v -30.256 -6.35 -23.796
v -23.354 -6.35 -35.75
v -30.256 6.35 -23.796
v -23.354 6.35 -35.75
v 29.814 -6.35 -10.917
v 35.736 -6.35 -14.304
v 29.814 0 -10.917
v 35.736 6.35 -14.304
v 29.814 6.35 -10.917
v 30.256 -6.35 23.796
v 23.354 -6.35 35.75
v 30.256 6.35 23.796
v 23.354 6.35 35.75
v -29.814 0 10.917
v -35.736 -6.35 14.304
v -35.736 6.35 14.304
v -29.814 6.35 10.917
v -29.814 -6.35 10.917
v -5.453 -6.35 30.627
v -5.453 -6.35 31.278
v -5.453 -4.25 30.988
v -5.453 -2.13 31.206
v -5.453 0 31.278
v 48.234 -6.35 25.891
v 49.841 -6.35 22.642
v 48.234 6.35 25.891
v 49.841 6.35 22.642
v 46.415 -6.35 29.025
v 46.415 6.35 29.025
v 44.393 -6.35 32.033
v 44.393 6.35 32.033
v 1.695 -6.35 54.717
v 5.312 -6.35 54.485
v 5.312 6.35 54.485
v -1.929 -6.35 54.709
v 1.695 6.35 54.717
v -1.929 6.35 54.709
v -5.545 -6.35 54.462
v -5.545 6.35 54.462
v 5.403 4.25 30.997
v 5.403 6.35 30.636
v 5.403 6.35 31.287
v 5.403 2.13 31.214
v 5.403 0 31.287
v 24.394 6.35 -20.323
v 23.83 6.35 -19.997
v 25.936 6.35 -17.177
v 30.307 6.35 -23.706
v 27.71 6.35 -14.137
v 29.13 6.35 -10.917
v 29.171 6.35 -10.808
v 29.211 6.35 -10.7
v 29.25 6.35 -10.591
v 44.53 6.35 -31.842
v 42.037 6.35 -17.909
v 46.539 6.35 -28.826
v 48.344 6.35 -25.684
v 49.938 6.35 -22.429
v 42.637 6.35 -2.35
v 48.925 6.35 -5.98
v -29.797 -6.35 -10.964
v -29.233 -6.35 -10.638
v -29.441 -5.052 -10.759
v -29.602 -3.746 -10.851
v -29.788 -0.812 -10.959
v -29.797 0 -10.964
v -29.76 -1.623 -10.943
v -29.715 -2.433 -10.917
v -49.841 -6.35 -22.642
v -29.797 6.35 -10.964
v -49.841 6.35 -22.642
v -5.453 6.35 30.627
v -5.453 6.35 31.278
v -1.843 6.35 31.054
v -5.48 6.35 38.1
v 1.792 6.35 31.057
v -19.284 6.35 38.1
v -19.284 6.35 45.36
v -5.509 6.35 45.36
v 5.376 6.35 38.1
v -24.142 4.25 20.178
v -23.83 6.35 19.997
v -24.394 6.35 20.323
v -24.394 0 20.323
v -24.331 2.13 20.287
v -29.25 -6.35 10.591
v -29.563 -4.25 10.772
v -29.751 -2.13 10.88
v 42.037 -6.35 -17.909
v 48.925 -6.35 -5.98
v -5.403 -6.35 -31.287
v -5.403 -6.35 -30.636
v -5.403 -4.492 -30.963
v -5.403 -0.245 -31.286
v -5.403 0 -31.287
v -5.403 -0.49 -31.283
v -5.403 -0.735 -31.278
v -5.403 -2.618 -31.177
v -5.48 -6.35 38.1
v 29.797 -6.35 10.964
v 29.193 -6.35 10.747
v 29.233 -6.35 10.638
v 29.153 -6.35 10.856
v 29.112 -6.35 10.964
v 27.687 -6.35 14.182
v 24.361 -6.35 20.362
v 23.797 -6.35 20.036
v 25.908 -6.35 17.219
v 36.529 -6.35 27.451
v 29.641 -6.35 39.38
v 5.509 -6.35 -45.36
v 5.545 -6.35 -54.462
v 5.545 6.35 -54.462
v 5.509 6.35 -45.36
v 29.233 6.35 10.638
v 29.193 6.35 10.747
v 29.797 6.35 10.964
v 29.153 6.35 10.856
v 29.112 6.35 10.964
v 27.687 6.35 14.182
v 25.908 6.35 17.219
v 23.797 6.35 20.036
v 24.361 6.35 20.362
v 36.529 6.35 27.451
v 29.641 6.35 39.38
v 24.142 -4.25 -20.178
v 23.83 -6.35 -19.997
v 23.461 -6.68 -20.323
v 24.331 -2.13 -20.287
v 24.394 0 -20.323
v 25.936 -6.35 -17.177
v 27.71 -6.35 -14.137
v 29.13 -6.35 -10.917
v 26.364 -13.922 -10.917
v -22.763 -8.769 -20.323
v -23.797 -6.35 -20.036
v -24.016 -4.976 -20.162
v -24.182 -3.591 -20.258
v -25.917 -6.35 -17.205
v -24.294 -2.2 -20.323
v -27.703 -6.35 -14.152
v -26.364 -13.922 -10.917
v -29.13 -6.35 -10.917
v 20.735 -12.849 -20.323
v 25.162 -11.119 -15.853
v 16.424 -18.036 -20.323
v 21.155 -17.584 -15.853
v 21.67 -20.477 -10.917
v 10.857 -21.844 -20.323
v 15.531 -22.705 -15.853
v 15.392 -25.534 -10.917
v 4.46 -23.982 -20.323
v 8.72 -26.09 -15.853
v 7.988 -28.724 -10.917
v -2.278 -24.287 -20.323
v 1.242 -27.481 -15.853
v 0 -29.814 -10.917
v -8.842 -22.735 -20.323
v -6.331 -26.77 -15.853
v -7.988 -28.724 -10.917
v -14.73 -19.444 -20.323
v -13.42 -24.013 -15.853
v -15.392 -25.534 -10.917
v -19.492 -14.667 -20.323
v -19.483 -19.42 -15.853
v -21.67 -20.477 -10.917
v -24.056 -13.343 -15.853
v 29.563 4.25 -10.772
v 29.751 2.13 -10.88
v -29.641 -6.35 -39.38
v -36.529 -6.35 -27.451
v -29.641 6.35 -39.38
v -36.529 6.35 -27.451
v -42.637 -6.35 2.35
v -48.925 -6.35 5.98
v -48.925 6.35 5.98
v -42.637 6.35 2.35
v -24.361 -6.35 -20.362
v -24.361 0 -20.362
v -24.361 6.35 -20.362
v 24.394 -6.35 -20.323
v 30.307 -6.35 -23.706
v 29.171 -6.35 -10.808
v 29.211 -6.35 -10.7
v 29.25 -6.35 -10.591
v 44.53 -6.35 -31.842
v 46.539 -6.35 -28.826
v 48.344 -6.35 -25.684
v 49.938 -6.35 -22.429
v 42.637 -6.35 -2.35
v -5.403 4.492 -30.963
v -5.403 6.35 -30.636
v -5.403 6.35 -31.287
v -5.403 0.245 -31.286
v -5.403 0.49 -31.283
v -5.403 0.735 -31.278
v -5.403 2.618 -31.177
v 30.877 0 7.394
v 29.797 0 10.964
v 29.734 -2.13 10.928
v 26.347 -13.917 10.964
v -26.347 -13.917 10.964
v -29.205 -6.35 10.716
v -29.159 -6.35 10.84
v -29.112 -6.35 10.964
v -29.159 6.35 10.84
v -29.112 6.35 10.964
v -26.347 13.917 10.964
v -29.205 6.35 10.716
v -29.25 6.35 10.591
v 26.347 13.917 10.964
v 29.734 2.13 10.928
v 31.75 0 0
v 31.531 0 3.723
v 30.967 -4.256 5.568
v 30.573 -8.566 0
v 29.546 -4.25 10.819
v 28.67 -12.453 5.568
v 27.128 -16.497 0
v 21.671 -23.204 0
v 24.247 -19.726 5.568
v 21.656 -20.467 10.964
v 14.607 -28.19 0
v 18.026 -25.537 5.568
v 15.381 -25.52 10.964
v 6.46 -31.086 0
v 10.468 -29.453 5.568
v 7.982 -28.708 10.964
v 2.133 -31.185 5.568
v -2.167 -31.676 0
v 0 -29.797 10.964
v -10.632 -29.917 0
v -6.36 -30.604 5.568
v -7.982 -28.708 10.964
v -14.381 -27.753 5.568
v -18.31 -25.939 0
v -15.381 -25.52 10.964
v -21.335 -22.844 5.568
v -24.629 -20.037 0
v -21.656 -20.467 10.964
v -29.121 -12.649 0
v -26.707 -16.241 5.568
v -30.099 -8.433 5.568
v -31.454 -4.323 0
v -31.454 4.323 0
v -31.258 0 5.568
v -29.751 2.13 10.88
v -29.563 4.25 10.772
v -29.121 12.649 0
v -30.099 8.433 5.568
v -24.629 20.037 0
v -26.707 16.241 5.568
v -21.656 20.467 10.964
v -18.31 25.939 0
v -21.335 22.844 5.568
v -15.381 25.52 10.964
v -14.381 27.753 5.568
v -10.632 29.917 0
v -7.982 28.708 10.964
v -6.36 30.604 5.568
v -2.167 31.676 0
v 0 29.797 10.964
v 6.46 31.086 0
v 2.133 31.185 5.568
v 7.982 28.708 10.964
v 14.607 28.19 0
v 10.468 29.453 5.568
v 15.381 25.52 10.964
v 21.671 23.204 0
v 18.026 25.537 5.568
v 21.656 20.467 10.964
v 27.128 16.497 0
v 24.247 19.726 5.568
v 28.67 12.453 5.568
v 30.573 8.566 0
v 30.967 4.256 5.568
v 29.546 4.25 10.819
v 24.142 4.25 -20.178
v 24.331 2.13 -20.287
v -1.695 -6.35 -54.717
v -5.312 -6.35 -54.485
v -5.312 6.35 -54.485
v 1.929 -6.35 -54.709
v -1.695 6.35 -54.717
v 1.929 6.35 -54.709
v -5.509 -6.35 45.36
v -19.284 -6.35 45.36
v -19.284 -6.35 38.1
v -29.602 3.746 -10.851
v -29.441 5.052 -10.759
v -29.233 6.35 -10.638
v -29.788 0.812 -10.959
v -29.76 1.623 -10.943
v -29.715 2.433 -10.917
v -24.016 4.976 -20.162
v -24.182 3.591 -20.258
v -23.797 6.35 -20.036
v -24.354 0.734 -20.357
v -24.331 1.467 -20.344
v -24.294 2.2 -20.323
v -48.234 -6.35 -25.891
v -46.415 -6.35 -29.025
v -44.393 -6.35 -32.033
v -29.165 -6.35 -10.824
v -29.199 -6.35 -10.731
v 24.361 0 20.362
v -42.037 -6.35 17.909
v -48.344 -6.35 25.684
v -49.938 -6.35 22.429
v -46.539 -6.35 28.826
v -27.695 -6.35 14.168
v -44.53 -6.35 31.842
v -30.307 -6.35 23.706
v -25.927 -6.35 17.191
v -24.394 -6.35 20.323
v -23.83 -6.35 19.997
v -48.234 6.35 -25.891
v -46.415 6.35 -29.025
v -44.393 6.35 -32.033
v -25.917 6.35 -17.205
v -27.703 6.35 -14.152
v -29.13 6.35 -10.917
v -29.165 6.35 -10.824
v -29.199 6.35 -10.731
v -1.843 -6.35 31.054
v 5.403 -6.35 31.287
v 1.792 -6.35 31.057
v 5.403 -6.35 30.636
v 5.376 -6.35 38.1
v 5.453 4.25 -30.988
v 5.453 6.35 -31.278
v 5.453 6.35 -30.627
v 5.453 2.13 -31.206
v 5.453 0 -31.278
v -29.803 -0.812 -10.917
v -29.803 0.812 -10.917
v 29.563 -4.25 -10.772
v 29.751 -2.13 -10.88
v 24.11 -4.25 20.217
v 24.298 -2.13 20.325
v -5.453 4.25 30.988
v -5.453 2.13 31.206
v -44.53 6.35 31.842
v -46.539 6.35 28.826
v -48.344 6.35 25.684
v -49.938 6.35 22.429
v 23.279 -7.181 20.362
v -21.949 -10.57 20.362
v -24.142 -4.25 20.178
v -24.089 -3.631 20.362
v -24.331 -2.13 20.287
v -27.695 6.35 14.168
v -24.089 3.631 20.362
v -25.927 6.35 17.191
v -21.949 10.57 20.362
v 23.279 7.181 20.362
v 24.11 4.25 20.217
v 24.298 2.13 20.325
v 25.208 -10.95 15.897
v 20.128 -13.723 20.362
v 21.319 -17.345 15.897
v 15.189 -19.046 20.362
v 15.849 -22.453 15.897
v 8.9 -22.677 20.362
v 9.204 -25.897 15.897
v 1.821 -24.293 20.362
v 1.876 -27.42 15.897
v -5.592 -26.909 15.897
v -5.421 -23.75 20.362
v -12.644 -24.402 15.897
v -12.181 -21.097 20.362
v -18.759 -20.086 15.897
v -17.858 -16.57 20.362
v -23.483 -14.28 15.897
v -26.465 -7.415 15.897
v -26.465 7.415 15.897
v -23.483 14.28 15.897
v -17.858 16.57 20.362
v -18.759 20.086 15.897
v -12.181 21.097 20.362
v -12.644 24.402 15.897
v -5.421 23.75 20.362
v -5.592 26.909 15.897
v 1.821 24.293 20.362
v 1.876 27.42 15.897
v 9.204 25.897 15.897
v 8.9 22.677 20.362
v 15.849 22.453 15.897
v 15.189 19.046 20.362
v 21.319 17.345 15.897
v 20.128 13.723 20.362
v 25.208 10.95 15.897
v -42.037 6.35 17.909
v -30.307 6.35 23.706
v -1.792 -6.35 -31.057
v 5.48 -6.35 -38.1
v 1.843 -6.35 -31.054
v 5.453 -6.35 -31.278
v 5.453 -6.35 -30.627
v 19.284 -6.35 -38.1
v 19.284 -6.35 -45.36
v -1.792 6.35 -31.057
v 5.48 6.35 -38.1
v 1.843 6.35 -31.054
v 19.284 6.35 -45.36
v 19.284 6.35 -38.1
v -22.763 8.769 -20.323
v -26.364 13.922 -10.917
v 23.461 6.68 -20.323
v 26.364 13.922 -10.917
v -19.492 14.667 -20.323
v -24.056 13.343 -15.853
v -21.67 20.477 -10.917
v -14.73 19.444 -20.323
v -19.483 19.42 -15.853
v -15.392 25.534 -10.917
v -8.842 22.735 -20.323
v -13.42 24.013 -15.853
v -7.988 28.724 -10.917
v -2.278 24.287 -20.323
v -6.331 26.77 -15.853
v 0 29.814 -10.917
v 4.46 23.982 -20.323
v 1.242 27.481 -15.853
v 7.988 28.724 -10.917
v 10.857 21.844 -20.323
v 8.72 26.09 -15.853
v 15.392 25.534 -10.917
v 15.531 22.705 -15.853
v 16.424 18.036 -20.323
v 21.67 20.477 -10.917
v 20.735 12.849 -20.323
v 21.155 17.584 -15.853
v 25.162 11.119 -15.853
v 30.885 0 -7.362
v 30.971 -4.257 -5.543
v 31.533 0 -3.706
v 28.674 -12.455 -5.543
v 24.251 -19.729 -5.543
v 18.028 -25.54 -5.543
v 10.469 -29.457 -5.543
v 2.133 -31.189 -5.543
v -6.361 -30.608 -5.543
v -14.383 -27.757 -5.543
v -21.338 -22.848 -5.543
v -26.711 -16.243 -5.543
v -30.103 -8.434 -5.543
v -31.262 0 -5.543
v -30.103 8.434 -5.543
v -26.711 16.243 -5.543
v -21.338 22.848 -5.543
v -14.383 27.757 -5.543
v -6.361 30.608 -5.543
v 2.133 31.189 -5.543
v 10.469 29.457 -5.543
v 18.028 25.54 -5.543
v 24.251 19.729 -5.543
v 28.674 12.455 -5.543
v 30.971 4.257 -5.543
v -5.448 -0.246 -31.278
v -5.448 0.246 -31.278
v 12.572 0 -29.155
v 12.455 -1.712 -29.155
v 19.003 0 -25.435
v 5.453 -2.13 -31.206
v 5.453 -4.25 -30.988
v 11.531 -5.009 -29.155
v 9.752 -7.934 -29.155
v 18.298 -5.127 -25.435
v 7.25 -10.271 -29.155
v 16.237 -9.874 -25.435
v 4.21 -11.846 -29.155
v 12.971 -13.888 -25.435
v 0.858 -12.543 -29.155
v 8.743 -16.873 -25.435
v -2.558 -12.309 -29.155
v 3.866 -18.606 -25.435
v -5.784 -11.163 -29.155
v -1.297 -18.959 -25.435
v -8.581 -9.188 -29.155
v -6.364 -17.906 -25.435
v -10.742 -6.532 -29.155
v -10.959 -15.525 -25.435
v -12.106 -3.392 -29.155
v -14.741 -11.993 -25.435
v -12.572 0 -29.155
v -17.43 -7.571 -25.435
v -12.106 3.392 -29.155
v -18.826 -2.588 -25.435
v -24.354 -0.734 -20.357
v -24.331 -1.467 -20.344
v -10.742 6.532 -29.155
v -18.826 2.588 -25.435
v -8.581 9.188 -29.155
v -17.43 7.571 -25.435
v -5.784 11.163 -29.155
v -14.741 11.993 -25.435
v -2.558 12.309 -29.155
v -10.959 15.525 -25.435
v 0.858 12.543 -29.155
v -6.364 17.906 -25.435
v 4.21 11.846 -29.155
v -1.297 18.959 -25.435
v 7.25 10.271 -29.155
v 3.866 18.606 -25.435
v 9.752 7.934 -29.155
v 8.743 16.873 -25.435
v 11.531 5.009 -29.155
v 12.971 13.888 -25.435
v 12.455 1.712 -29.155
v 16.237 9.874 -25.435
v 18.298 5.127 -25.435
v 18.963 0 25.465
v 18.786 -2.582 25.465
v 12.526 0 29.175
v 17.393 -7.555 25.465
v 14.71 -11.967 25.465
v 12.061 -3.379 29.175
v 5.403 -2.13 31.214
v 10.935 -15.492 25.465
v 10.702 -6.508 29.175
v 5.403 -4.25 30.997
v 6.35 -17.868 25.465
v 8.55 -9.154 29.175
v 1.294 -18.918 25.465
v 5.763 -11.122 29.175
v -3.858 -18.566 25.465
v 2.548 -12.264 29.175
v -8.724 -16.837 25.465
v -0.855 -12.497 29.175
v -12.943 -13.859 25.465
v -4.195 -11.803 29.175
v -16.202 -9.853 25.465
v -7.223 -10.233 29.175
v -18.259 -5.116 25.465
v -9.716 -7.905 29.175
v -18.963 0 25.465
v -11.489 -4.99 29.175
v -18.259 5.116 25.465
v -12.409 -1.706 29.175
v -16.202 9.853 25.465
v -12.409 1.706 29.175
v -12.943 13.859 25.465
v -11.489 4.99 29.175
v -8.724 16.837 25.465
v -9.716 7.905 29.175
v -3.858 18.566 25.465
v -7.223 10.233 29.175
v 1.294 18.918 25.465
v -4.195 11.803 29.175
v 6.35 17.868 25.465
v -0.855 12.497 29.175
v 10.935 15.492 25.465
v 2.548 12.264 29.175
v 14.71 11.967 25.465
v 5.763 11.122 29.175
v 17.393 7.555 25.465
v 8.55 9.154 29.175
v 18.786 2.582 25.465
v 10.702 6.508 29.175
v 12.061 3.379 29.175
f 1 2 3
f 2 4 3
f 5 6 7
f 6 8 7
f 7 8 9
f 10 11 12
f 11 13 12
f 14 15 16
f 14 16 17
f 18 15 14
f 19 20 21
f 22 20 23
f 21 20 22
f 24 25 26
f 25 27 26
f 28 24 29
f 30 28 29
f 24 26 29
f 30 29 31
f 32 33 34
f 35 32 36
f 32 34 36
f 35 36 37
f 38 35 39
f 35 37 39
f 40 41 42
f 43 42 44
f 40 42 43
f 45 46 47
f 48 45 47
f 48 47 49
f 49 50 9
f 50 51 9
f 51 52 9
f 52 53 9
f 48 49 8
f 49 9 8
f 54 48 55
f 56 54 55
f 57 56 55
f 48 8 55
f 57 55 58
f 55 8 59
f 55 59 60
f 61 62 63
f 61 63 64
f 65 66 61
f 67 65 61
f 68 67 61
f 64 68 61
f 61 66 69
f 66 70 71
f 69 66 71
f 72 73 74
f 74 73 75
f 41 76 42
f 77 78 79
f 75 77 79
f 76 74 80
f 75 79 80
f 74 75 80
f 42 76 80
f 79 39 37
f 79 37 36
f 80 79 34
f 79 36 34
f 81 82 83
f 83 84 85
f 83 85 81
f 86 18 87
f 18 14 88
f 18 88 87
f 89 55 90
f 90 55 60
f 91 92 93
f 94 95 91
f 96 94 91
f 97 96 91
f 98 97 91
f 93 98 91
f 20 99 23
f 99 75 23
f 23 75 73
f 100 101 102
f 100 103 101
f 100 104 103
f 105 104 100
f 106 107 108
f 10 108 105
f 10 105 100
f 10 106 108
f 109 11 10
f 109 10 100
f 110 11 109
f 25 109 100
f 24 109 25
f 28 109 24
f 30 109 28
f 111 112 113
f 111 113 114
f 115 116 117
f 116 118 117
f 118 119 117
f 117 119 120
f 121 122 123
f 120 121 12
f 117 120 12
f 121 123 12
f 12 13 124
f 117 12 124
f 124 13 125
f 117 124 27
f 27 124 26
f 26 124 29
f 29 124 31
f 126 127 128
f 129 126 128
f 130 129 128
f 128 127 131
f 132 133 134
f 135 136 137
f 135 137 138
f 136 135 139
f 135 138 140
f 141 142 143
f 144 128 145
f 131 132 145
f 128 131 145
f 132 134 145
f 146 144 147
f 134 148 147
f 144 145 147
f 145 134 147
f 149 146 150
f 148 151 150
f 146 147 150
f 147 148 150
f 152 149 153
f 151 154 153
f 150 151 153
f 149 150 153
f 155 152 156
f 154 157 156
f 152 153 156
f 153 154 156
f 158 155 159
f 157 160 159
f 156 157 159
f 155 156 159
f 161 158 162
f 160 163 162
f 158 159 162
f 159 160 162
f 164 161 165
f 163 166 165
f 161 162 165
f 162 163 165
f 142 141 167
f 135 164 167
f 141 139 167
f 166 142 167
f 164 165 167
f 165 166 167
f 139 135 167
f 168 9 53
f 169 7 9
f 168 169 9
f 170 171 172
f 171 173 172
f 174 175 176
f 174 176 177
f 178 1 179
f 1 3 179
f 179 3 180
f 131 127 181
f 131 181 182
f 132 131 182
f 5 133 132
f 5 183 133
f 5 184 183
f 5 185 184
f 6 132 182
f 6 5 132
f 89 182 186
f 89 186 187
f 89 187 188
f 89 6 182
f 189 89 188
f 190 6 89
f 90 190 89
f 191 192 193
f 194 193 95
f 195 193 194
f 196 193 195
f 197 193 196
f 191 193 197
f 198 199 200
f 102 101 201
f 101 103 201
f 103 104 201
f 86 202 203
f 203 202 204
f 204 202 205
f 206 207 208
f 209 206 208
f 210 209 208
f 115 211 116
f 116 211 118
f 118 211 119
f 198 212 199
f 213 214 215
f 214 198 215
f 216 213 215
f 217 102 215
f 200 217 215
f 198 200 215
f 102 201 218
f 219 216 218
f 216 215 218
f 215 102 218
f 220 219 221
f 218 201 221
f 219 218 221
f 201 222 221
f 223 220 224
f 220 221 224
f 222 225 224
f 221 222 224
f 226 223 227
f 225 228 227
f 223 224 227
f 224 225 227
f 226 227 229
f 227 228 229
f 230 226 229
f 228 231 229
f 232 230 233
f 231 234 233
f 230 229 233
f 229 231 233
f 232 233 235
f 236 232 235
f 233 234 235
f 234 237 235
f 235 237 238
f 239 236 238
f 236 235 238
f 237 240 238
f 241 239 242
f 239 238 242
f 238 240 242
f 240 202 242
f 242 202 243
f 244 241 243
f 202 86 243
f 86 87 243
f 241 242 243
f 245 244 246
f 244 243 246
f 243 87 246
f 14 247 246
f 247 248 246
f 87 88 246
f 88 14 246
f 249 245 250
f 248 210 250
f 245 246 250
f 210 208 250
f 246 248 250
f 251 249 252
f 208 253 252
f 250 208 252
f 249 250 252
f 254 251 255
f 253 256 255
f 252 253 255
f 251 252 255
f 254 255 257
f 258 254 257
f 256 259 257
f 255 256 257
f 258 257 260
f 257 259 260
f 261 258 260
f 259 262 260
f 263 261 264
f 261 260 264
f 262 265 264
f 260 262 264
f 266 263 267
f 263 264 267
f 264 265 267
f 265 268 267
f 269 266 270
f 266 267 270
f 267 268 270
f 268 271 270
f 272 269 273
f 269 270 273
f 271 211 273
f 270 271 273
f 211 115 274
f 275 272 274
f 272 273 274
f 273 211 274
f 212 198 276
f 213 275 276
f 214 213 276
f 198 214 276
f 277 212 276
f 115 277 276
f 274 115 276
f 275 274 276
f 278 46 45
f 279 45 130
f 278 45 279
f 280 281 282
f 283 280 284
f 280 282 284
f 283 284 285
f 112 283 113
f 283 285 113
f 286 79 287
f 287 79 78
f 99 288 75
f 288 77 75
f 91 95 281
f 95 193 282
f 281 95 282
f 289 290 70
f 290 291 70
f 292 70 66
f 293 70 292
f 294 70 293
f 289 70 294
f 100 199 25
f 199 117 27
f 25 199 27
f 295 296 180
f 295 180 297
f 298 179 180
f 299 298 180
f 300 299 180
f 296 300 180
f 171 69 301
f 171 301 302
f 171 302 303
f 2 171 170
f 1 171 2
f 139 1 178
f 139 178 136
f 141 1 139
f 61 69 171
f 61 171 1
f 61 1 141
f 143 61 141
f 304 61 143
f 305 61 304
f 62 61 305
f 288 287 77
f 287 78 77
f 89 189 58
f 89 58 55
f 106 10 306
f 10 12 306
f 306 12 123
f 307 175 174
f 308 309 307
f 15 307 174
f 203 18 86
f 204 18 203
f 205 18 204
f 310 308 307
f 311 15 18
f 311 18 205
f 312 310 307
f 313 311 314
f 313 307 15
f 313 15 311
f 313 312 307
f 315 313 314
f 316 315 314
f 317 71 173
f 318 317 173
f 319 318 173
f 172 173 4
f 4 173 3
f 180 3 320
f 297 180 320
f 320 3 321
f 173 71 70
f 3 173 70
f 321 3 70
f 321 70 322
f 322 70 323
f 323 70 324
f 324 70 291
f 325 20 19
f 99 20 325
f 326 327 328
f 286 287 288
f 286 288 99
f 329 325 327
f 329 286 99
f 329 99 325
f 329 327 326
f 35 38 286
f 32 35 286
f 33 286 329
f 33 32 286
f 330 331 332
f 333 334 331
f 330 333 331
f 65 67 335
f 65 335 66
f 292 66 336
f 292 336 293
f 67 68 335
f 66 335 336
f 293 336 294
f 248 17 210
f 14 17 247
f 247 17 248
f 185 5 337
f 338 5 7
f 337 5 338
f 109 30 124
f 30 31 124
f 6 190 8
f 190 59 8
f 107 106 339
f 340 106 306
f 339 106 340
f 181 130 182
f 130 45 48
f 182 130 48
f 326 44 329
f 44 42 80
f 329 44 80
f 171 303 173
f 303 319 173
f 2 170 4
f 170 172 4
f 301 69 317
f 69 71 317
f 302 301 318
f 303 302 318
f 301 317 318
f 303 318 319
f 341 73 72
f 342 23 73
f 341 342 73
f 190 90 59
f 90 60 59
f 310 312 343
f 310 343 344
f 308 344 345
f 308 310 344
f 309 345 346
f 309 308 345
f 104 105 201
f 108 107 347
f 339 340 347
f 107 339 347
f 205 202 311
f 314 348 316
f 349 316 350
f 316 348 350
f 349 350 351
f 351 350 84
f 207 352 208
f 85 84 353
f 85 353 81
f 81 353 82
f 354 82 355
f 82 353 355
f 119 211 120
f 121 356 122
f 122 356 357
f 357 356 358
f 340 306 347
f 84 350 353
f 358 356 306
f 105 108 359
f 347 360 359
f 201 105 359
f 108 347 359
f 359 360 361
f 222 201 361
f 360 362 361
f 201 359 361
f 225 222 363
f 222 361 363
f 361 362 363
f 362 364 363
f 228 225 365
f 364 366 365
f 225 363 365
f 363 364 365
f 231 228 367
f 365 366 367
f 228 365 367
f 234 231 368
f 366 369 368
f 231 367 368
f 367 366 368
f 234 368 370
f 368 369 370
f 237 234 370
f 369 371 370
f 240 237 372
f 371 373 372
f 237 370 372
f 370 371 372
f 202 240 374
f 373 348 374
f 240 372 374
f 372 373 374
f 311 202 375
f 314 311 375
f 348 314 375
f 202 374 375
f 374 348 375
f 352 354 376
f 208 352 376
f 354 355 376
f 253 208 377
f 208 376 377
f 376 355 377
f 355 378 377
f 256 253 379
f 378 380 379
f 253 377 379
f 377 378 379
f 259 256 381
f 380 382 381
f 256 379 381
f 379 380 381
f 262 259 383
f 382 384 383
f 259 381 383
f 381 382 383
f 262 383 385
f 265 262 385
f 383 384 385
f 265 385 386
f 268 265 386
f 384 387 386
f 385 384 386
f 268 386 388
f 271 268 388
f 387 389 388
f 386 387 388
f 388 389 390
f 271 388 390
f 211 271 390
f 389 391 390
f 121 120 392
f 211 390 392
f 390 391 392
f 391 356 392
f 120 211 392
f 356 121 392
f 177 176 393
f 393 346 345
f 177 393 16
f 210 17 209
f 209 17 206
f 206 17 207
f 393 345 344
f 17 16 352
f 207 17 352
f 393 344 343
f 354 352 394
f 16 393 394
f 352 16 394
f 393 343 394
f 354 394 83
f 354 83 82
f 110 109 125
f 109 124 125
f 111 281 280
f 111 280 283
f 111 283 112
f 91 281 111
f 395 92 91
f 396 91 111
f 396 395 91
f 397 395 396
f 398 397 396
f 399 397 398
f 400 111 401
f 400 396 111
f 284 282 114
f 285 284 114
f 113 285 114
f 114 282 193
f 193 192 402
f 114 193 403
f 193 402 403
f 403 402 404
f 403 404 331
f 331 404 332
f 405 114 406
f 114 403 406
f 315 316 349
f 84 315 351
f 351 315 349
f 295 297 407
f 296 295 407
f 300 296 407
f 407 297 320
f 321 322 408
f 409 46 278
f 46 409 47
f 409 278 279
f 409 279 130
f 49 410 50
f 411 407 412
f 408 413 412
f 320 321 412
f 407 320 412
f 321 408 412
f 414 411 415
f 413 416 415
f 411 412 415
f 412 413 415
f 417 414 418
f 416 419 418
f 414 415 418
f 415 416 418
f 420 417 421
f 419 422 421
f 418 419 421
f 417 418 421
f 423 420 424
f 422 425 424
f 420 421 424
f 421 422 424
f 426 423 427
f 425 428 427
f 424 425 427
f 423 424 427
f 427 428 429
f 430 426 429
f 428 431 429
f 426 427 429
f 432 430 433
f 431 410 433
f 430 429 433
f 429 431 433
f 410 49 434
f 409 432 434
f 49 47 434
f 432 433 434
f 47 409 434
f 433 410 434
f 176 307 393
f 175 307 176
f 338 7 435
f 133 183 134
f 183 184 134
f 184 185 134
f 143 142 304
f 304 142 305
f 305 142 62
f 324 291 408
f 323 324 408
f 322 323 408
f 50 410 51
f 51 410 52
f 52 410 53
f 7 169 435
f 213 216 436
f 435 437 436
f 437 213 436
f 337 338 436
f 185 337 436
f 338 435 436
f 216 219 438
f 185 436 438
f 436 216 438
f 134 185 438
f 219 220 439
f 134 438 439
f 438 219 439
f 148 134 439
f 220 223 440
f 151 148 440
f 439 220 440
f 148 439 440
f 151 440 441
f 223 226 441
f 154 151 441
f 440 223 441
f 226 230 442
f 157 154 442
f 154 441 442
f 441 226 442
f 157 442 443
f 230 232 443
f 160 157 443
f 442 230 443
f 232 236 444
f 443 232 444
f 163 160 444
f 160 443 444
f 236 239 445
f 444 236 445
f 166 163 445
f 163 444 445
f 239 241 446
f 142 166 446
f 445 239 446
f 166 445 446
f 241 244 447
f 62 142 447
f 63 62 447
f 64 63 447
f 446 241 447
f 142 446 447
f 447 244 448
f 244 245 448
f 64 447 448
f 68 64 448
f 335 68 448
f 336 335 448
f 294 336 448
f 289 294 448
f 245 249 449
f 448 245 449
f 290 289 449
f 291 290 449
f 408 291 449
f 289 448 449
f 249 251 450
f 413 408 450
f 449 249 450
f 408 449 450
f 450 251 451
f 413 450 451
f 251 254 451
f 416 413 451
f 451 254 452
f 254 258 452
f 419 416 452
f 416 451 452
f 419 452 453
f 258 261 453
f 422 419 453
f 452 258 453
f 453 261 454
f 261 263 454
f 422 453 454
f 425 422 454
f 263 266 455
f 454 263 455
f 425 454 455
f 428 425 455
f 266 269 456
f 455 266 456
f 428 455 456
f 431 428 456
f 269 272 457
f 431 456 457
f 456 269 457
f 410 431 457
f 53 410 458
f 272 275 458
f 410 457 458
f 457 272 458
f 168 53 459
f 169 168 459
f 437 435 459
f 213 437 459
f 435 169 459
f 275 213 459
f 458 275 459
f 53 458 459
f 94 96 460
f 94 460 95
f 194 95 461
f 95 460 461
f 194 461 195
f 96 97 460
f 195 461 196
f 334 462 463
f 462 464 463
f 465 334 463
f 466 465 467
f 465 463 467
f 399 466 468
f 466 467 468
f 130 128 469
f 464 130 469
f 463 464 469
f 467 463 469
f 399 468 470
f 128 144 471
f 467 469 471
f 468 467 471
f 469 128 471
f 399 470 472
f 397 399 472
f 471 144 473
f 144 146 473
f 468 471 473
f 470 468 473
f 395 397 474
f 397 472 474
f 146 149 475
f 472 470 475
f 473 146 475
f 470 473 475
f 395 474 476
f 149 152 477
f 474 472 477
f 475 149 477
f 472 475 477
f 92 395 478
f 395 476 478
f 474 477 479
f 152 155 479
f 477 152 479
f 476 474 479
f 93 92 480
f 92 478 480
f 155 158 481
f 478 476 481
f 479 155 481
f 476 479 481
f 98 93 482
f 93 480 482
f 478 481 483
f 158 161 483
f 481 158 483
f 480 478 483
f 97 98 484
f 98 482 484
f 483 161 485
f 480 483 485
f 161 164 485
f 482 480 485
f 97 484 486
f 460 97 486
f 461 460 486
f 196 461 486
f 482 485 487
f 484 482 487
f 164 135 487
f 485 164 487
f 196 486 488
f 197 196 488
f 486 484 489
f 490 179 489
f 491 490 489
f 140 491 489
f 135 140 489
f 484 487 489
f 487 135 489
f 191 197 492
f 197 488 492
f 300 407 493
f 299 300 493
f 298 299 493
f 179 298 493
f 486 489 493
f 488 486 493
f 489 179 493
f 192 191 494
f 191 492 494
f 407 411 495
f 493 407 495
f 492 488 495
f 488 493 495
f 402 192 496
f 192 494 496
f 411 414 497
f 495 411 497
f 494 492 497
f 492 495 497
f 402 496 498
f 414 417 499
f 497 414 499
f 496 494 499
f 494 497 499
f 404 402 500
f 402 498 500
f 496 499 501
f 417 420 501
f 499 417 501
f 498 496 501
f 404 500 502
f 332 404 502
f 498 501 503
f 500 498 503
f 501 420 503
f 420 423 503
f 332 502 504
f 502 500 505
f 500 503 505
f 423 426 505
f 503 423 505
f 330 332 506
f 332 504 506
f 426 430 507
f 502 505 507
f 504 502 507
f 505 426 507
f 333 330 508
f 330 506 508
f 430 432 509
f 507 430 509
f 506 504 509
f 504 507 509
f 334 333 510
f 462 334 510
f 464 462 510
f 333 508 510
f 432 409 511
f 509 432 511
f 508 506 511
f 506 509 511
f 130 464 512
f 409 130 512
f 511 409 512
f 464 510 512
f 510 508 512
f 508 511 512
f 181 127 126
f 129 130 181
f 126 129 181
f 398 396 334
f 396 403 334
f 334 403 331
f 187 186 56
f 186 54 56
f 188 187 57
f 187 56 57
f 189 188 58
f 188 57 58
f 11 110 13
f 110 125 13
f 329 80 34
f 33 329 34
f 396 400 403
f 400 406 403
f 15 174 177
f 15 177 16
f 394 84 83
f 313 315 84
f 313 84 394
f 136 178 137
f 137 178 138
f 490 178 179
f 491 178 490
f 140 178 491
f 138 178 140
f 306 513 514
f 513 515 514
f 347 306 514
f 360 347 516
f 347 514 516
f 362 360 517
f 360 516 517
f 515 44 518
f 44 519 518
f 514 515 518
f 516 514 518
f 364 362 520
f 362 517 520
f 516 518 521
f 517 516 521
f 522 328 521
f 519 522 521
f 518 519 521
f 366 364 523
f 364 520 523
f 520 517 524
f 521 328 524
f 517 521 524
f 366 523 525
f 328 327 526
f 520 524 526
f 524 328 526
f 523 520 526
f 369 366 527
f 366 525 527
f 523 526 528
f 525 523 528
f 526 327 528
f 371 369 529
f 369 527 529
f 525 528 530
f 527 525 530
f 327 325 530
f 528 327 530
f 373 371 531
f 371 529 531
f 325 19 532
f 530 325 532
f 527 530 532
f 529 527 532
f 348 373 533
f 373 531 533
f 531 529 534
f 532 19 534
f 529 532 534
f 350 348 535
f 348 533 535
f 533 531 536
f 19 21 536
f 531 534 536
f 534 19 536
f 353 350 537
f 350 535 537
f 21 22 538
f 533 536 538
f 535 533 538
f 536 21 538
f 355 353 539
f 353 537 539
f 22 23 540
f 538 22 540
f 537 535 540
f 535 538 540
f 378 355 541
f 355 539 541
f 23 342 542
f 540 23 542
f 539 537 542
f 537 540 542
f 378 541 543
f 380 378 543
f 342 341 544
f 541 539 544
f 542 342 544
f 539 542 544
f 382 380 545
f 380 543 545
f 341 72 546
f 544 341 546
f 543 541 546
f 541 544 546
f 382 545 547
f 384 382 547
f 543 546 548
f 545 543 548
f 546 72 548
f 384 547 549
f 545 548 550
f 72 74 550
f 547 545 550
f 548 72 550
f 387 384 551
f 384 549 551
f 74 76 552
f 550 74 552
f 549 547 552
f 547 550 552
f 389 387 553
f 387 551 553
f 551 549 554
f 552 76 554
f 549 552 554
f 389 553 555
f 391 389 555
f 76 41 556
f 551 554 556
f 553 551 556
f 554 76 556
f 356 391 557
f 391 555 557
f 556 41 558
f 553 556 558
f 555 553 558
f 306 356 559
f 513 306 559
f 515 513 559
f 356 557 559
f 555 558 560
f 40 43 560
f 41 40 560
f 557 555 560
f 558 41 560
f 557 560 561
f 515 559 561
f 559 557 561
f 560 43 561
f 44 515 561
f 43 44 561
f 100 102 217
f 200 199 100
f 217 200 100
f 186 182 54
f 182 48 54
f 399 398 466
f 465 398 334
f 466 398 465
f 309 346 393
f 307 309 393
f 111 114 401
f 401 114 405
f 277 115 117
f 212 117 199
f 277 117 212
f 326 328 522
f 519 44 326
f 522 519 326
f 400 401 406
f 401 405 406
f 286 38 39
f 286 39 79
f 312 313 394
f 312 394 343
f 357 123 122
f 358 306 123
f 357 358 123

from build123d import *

# Parameters (mm, degrees)
F4_DEPTH = 6.35


# Not quite as in the source:
# - the program builds the solid bodies; features that only make, move or delete a surface that nothing else refers to are left out


with BuildPart() as f2:
    # F0 (on Front) → F2 (revolve)
    with BuildSketch(Plane.XZ):
        with BuildLine():
            ThreePointArc((24.3612137616, 20.3615756773), (15.8531486732, 27.508910868), (5.403325821, 31.2868434022))
            ThreePointArc((5.403325821, 31.2868434022), (2.7115698388, 31.6339989412), (0, 31.75))
            Line((0, 31.75), (0, -31.75))
            ThreePointArc((0, -31.75), (2.736702771, -31.6318345649), (5.4530349168, -31.2782178232))
            ThreePointArc((5.4530349168, -31.2782178232), (15.8968413055, -27.483684915), (24.39353828, -20.322839127))
            ThreePointArc((24.39353828, -20.322839127), (27.508910868, -15.8531486732), (29.8142486784, -10.9166421459))
            ThreePointArc((29.8142486784, -10.9166421459), (31.2623167371, -5.5434693316), (31.75, 0))
            ThreePointArc((31.75, 0), (31.2579024825, 5.5683060617), (29.796864101, 10.9640042752))
            ThreePointArc((29.796864101, 10.9640042752), (27.483684915, 15.8968413055), (24.3612137616, 20.3615756773))
        make_face()
    revolve(axis=Axis((0, 0, 0), (0, 0, -1)))

    # F3 (on Front) → F4 (join, symmetric)
    with BuildSketch(Plane.XZ):
        with BuildLine():
            Line((5.376374884, 38.1001170391), (5.3115624093, 54.484895228))
            ThreePointArc((5.3115624093, 54.484895228), (-0.1171664817, 54.7430614347), (-5.5447405359, 54.4616595011))
            Line((-5.5447405359, 54.4616595011), (-5.5087377694, 45.3600575994))
            Line((-5.5087377694, 45.3600575994), (-19.2836534145, 45.3600575994))
            Line((-19.2836534145, 45.3600575994), (-19.2836534145, 38.1001170391))
            Line((-19.2836534145, 38.1001170391), (-5.4800199737, 38.1001170391))
            Line((-5.4800199737, 38.1001170391), (-5.4530349168, 31.2782178232))
            Line((-5.4530349168, 31.2782178232), (-5.4530349168, 22.3882178232))
            Line((-5.4530349168, 22.3882178232), (5.403325821, 22.3882178232))
            Line((5.403325821, 22.3882178232), (5.403325821, 31.2868434022))
            Line((5.403325821, 31.2868434022), (5.376374884, 38.1001170391))
        make_face()
        with BuildLine():
            Line((22.0904282909, 6.5146914857), (29.796864101, 10.9640042752))
            Line((29.796864101, 10.9640042752), (49.8410845946, 22.6424996338))
            ThreePointArc((49.8410845946, 22.6424996338), (47.3502986425, 27.472999867), (44.3928103923, 32.0327159121))
            Line((44.3928103923, 32.0327159121), (36.5285933135, 27.4507356508))
            Line((36.5285933135, 27.4507356508), (29.6411354909, 39.3801625345))
            Line((29.6411354909, 39.3801625345), (23.3538425357, 35.7501922543))
            Line((23.3538425357, 35.7501922543), (30.2556592562, 23.79589503))
            Line((30.2556592562, 23.79589503), (24.3612137616, 20.3615756773))
            Line((24.3612137616, 20.3615756773), (16.6622479219, 15.9165756773))
            Line((16.6622479219, 15.9165756773), (22.0904282909, 6.5146914857))
        make_face()
        with BuildLine():
            Line((16.6871024699, -15.8735263375), (24.39353828, -20.322839127))
            Line((24.39353828, -20.322839127), (30.307481801, -23.7061357493))
            Line((30.307481801, -23.7061357493), (44.5295221853, -31.8423955942))
            ThreePointArc((44.5295221853, -31.8423955942), (47.4674651242, -27.2700615677), (49.9375509282, -22.4289435891))
            Line((49.9375509282, -22.4289435891), (42.0373310829, -17.9093219486))
            Line((42.0373310829, -17.9093219486), (48.9247889055, -5.9798950649))
            Line((48.9247889055, -5.9798950649), (42.6374959503, -2.3499247848))
            Line((42.6374959503, -2.3499247848), (35.7356792298, -14.3042220091))
            Line((35.7356792298, -14.3042220091), (29.8142486784, -10.9166421459))
            Line((29.8142486784, -10.9166421459), (22.1152828388, -6.4716421459))
            Line((22.1152828388, -6.4716421459), (16.6871024699, -15.8735263375))
        make_face()
        with BuildLine():
            Line((-5.403325821, -22.3882178232), (-5.403325821, -31.2868434022))
            Line((-5.403325821, -31.2868434022), (-5.3115624093, -54.484895228))
            ThreePointArc((-5.3115624093, -54.484895228), (0.1171664817, -54.7430614347), (5.5447405359, -54.4616595011))
            Line((5.5447405359, -54.4616595011), (5.5087377694, -45.3600575994))
            Line((5.5087377694, -45.3600575994), (19.2836534145, -45.3600575994))
            Line((19.2836534145, -45.3600575994), (19.2836534145, -38.1001170391))
            Line((19.2836534145, -38.1001170391), (5.4800199737, -38.1001170391))
            Line((5.4800199737, -38.1001170391), (5.4530349168, -31.2782178232))
            Line((5.4530349168, -31.2782178232), (5.4530349168, -22.3882178232))
            Line((5.4530349168, -22.3882178232), (-5.403325821, -22.3882178232))
        make_face()
        with BuildLine():
            Line((-29.796864101, -10.9640042752), (-49.8410845946, -22.6424996338))
            ThreePointArc((-49.8410845946, -22.6424996338), (-47.3502986425, -27.472999867), (-44.3928103923, -32.0327159121))
            Line((-44.3928103923, -32.0327159121), (-36.5285933135, -27.4507356508))
            Line((-36.5285933135, -27.4507356508), (-29.6411354909, -39.3801625345))
            Line((-29.6411354909, -39.3801625345), (-23.3538425357, -35.7501922543))
            Line((-23.3538425357, -35.7501922543), (-30.2556592562, -23.79589503))
            Line((-30.2556592562, -23.79589503), (-24.3612137616, -20.3615756773))
            Line((-24.3612137616, -20.3615756773), (-16.6622479219, -15.9165756773))
            Line((-16.6622479219, -15.9165756773), (-22.0904282909, -6.5146914857))
            Line((-22.0904282909, -6.5146914857), (-29.796864101, -10.9640042752))
        make_face()
        with BuildLine():
            Line((-16.6871024699, 15.8735263375), (-24.39353828, 20.322839127))
            Line((-24.39353828, 20.322839127), (-30.307481801, 23.7061357493))
            Line((-30.307481801, 23.7061357493), (-44.5295221853, 31.8423955942))
            ThreePointArc((-44.5295221853, 31.8423955942), (-47.4674651242, 27.2700615677), (-49.9375509282, 22.4289435891))
            Line((-49.9375509282, 22.4289435891), (-42.0373310829, 17.9093219486))
            Line((-42.0373310829, 17.9093219486), (-48.9247889055, 5.9798950649))
            Line((-48.9247889055, 5.9798950649), (-42.6374959503, 2.3499247848))
            Line((-42.6374959503, 2.3499247848), (-35.7356792298, 14.3042220091))
            Line((-35.7356792298, 14.3042220091), (-29.8142486784, 10.9166421459))
            Line((-29.8142486784, 10.9166421459), (-22.1152828388, 6.4716421459))
            Line((-22.1152828388, 6.4716421459), (-16.6871024699, 15.8735263375))
        make_face()
    extrude(amount=F4_DEPTH, both=True)


solid = f2.part
